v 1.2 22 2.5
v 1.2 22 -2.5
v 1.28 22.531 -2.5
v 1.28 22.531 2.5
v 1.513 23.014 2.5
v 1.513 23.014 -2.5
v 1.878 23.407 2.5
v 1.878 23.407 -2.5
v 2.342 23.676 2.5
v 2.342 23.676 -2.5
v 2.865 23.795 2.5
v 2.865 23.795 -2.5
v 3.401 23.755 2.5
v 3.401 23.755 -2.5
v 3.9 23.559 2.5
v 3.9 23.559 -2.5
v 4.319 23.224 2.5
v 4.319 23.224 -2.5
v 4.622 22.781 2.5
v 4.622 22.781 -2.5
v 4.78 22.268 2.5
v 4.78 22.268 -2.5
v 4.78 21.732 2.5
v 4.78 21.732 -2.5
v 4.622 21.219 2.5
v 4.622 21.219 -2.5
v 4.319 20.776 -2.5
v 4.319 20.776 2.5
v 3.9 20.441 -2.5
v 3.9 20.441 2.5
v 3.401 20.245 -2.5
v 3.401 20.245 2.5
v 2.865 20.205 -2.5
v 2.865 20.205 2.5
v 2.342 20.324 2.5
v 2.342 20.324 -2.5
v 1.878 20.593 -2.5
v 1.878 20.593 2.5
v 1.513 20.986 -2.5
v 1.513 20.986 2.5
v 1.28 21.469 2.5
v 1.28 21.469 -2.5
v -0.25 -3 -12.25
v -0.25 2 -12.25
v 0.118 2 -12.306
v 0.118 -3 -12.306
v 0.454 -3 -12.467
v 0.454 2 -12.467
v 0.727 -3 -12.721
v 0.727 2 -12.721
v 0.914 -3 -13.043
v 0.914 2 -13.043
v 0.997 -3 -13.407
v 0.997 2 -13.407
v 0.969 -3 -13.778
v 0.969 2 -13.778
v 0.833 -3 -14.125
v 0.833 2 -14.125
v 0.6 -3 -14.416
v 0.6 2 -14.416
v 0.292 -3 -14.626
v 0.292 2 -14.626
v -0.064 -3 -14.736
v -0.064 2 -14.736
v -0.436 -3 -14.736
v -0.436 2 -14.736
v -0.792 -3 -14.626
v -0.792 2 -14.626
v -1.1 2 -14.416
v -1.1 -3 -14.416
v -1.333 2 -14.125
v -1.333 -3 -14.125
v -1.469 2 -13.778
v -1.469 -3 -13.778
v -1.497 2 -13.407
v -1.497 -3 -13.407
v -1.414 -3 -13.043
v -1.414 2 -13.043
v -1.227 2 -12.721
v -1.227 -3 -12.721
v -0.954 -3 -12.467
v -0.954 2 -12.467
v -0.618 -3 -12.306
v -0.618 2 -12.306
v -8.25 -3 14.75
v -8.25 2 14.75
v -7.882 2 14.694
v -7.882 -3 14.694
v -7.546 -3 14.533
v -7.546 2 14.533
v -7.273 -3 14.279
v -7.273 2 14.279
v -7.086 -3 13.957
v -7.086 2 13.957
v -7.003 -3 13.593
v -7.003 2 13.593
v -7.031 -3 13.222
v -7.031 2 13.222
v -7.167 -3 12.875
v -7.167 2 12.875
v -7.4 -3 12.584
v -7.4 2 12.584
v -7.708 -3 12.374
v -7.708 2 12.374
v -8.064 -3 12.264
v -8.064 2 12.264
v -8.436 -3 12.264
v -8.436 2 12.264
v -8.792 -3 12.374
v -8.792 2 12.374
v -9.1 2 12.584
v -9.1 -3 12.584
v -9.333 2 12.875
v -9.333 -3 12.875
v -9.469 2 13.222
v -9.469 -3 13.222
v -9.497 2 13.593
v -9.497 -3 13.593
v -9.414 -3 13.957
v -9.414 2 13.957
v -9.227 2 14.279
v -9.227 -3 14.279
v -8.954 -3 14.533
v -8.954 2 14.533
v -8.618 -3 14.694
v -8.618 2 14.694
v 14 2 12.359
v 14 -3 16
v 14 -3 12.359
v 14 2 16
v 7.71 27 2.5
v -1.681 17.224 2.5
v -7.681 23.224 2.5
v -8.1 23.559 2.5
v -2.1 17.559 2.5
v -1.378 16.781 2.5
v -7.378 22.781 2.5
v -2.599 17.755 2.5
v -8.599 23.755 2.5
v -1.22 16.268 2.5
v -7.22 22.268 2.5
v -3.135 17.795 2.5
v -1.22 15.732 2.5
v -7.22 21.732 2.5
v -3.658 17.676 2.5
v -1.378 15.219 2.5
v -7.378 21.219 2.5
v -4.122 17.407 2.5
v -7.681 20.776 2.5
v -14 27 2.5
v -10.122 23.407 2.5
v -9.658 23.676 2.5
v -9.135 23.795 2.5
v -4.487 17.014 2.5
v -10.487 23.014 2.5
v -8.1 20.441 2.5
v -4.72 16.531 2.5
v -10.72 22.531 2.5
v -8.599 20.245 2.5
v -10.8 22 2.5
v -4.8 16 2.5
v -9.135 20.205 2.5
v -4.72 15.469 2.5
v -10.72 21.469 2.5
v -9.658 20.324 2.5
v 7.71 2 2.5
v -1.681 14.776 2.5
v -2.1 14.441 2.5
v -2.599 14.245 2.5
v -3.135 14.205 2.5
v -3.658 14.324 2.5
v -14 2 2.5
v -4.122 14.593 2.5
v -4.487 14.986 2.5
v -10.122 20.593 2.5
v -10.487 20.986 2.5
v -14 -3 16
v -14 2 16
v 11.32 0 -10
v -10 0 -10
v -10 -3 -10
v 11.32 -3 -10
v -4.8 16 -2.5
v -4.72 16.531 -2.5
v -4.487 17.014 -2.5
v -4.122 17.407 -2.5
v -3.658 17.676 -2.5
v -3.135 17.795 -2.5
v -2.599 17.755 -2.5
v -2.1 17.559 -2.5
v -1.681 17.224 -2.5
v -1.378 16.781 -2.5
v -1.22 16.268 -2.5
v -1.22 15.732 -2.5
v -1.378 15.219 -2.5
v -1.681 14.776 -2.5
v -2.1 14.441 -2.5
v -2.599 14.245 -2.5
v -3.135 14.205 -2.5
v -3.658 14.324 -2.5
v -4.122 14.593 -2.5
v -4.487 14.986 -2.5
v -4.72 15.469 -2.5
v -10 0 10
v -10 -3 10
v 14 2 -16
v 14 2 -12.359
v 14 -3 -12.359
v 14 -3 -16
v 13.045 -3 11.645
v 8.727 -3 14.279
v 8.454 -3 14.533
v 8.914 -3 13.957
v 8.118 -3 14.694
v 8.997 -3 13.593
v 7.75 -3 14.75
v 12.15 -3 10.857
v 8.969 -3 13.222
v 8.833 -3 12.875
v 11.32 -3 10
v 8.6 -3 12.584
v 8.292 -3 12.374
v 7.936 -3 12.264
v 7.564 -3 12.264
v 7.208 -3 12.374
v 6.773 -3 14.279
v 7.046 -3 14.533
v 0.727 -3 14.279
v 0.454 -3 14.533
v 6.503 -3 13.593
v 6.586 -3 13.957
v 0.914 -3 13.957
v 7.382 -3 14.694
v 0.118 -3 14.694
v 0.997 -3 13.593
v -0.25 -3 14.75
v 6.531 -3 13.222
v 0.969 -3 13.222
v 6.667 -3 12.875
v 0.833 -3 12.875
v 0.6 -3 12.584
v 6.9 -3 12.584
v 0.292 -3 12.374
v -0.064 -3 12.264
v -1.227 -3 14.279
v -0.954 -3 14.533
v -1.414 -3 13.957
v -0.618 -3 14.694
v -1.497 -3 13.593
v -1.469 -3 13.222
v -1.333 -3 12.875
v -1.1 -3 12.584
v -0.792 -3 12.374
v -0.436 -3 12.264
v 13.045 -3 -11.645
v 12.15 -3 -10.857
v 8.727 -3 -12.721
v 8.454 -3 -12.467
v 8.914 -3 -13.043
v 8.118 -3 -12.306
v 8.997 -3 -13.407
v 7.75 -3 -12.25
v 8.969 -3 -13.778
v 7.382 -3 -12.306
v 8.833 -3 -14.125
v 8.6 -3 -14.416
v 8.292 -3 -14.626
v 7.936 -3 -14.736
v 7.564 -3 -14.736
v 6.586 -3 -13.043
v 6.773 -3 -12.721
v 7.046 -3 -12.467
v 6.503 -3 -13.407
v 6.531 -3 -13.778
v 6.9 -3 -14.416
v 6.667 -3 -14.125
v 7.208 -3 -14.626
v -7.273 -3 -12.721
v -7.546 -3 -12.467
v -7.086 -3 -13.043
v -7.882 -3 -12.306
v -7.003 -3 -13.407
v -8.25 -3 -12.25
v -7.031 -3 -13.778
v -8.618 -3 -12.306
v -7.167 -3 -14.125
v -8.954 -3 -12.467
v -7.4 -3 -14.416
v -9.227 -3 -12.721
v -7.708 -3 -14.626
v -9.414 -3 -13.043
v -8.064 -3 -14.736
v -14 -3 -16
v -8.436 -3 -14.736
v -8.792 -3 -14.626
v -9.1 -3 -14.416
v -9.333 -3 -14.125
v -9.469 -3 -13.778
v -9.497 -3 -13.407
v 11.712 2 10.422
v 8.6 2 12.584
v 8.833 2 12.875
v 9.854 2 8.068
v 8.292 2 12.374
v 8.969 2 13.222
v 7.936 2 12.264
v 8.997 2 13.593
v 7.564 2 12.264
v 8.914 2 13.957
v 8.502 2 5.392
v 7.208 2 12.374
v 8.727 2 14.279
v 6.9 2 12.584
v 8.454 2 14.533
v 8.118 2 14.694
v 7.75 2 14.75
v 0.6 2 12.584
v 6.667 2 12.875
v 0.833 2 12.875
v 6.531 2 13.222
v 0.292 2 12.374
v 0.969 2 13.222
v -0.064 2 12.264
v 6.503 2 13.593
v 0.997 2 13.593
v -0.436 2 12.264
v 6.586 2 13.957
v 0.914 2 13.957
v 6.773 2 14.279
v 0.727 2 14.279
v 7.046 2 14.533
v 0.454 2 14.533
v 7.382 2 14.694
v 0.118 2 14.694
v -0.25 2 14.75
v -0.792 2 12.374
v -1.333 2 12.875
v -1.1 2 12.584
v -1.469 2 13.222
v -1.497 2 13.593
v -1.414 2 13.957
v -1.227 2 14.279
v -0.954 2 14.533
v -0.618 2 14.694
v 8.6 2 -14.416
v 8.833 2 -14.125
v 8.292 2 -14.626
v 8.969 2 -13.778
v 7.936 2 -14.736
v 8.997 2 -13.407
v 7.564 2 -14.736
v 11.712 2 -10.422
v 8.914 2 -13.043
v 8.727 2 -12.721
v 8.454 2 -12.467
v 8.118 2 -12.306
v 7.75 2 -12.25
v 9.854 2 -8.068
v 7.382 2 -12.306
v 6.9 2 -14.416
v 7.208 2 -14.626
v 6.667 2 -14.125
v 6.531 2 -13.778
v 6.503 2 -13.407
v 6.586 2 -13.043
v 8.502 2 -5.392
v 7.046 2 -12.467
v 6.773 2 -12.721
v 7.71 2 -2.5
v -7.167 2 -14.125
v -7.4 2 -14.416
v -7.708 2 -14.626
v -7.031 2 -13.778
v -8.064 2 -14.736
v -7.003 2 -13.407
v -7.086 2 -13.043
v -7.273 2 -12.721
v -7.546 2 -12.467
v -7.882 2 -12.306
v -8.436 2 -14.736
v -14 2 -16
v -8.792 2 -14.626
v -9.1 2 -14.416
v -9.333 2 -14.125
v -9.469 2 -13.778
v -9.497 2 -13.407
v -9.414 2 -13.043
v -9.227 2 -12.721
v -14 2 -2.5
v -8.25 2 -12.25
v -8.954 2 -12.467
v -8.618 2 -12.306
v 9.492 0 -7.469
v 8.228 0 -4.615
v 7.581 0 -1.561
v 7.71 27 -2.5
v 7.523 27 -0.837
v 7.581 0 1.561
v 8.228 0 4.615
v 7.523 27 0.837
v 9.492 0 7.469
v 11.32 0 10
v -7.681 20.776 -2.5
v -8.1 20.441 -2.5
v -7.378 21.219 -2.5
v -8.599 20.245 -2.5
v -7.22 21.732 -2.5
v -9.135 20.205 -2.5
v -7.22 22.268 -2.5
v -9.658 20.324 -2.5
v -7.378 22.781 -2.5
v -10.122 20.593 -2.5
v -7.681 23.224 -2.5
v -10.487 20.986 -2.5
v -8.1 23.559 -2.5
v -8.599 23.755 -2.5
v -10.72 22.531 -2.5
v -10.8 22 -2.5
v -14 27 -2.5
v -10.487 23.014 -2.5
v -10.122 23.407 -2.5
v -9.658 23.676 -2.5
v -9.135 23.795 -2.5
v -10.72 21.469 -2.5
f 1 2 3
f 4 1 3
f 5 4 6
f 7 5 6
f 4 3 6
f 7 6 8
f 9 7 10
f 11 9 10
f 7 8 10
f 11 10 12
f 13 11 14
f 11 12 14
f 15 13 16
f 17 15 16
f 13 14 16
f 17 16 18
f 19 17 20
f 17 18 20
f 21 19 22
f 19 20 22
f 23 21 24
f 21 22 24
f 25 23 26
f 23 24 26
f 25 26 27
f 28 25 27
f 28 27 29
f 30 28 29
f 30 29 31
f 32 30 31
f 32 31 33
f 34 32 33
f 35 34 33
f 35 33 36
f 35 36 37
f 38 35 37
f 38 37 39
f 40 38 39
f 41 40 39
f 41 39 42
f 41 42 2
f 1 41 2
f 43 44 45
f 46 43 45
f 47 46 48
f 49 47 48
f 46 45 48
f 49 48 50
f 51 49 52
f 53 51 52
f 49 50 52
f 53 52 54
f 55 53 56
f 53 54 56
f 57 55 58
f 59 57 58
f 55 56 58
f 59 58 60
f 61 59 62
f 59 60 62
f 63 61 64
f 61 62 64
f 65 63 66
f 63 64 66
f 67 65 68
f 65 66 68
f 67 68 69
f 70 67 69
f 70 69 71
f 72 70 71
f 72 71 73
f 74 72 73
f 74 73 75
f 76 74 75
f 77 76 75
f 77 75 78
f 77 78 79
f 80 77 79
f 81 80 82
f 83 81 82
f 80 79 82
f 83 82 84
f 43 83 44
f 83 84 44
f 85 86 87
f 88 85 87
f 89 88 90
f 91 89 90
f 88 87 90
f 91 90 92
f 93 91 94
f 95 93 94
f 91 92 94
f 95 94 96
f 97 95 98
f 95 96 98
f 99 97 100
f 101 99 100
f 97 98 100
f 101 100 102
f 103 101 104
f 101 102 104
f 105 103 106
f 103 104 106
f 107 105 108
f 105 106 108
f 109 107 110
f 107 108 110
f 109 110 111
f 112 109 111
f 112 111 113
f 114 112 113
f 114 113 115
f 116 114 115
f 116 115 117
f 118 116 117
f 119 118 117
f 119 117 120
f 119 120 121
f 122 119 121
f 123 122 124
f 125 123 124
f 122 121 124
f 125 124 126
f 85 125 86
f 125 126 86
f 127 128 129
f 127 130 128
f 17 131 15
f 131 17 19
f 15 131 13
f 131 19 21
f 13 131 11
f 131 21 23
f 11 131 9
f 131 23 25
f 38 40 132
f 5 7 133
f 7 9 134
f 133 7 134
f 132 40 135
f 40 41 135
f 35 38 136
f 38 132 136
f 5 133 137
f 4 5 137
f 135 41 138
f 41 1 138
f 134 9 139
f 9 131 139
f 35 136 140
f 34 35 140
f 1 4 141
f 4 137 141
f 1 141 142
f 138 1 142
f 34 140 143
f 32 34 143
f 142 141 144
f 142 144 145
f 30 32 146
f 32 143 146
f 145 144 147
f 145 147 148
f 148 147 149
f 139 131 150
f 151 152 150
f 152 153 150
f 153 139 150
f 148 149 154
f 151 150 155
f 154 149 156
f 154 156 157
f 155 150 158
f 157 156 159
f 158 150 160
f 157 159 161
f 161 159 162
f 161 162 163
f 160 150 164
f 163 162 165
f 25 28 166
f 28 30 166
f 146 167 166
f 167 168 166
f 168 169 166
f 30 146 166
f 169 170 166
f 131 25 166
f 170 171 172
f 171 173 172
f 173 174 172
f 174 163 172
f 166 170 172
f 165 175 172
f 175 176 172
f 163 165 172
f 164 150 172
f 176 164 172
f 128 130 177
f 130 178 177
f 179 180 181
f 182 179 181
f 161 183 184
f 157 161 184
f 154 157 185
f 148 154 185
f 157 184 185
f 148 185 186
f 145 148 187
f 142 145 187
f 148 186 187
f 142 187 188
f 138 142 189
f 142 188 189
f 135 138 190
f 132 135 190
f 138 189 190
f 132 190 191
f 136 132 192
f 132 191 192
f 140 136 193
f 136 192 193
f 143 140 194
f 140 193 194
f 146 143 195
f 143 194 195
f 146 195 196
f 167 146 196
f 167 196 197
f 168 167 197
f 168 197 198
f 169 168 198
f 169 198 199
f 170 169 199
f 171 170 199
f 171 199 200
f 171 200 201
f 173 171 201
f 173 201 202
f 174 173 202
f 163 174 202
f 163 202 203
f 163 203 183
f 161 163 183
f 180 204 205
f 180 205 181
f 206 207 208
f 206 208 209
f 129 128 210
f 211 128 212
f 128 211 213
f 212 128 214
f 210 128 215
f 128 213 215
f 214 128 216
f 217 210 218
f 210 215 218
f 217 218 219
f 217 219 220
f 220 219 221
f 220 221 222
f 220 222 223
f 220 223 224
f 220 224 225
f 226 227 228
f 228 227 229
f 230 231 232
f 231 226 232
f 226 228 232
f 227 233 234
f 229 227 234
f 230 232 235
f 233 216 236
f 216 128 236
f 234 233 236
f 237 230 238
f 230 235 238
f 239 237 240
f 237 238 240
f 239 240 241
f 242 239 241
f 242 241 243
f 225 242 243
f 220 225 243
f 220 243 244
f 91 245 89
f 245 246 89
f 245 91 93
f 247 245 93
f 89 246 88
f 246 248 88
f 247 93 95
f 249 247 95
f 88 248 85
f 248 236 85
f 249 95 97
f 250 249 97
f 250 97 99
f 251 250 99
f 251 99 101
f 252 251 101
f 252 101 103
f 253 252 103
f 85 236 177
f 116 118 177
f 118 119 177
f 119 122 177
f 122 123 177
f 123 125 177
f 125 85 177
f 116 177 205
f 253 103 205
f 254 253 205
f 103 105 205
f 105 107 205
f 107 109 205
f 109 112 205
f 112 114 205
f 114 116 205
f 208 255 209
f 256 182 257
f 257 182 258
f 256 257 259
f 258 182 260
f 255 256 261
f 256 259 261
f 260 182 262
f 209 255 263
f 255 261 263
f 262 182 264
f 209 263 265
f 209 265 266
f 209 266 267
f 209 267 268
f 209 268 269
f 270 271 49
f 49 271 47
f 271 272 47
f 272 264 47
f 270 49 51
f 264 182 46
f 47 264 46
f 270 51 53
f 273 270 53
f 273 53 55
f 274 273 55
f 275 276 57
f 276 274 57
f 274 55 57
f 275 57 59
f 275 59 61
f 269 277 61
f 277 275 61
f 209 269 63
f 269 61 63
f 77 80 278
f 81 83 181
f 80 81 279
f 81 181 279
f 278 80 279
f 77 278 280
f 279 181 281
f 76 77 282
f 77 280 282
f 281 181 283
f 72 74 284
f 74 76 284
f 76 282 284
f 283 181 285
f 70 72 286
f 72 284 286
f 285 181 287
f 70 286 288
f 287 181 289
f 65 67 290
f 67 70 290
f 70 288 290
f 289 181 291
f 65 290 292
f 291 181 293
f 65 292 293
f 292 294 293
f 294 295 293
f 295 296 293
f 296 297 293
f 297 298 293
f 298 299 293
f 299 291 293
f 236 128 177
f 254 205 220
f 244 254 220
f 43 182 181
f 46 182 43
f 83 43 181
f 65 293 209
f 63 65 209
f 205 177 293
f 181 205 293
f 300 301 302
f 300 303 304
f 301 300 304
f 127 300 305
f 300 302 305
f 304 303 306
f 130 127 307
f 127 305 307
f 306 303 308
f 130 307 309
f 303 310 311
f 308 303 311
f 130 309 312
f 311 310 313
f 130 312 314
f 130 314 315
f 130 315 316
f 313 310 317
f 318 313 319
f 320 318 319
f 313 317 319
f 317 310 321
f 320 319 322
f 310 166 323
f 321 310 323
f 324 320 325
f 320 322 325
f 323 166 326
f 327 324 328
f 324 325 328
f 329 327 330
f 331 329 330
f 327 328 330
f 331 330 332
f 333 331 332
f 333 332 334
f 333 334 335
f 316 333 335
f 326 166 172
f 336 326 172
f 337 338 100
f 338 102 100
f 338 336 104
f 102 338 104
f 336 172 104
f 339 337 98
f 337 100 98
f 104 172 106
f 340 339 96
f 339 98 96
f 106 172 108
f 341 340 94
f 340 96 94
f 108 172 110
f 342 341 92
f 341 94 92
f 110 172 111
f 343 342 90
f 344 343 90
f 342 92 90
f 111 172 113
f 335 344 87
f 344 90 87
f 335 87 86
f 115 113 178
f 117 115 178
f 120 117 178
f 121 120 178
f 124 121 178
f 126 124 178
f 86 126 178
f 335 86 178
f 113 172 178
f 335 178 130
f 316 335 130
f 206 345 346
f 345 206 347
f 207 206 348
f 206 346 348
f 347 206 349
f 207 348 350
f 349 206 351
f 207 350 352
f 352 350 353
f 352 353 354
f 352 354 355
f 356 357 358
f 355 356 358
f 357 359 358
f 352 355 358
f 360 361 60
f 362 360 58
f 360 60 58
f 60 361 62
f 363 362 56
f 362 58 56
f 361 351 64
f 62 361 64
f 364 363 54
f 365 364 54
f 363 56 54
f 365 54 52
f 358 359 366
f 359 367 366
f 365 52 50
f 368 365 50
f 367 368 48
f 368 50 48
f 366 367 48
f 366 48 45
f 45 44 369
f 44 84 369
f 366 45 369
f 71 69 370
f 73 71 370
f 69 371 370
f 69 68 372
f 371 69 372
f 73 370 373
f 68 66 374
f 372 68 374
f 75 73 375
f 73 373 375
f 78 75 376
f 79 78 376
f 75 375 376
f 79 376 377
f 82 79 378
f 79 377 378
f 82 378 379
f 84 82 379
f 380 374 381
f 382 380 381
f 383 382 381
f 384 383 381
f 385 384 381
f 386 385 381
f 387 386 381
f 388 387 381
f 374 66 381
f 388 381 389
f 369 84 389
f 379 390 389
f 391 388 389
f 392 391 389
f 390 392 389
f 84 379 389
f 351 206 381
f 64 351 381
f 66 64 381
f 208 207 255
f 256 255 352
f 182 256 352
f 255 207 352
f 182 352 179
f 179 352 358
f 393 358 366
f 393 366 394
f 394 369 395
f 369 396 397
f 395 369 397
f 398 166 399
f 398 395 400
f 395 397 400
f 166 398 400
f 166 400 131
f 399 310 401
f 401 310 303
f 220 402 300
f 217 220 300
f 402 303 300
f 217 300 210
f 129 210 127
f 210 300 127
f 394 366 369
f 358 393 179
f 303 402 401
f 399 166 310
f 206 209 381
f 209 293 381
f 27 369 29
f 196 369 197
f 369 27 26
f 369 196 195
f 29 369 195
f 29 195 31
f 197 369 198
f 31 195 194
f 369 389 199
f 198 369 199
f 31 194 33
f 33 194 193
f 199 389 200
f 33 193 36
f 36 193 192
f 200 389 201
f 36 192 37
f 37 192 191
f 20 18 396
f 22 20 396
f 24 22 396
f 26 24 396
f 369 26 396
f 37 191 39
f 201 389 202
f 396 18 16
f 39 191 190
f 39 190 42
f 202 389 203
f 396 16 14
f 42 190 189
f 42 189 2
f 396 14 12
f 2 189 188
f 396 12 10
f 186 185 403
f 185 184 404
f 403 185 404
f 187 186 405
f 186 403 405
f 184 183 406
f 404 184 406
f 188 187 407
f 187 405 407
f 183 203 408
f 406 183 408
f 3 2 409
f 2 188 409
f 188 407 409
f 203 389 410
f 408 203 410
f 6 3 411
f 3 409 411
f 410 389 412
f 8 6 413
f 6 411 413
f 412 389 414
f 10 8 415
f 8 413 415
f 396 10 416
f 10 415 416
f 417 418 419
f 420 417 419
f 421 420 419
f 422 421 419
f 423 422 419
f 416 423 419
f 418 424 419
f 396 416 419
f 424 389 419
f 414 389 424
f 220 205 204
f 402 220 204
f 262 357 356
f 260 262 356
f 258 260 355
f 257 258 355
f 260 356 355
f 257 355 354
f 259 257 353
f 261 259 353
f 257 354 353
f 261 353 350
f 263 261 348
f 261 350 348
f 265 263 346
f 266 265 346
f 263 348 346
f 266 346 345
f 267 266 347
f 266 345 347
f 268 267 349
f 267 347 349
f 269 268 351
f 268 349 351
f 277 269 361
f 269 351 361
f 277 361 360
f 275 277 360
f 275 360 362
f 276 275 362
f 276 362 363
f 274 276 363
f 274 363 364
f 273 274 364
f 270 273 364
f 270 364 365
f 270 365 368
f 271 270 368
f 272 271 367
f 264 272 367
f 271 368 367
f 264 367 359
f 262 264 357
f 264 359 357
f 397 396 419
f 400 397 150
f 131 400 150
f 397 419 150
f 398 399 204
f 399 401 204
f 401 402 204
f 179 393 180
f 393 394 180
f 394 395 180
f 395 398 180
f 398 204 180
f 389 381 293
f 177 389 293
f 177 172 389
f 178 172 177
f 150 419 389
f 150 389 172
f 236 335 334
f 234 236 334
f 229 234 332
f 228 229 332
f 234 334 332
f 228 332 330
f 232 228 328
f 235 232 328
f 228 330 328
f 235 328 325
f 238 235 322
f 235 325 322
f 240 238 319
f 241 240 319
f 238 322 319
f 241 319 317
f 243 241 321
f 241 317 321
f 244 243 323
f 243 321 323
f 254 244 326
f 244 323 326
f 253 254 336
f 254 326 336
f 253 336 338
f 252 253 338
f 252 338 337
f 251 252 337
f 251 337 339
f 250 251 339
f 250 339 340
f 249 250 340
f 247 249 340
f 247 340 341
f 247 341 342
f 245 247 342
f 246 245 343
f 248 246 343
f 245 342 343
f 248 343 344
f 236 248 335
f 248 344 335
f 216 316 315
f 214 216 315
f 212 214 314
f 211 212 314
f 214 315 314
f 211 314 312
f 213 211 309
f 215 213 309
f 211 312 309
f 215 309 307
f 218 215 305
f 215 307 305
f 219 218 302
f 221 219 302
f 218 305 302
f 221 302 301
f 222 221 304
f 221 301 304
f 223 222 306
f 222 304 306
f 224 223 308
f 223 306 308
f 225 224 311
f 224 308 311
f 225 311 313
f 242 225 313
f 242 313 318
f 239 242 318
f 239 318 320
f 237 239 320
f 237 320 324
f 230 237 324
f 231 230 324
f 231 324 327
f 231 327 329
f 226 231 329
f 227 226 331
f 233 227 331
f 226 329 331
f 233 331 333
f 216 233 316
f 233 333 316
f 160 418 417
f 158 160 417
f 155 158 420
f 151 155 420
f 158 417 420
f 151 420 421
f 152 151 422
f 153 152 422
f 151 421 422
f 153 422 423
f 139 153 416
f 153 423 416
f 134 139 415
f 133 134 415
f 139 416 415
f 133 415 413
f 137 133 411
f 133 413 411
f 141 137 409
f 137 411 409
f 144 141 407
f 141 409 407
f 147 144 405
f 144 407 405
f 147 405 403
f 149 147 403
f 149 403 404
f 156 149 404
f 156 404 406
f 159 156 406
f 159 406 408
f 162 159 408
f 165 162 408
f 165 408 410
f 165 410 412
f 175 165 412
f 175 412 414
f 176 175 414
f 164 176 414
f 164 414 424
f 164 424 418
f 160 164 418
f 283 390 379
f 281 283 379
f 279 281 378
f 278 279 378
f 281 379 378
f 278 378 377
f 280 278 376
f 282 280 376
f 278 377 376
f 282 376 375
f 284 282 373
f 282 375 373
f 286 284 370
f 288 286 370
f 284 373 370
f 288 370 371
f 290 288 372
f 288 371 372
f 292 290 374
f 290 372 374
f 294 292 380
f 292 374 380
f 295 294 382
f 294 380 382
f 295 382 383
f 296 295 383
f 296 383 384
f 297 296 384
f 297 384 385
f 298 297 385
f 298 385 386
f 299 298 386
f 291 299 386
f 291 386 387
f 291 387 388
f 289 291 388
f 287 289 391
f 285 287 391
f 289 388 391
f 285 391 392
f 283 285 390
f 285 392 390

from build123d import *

# Parameters (mm, degrees)
SZKIC1_W                    = 20
SZKIC1_H                    = 20
DODANIE_WYCI_GNI_CIE1_DEPTH = 2
SZKIC3_R                    = 1.25
DODANIE_WYCI_GNI_CIE2_DEPTH = 5
SZKIC4_W                    = 24
SZKIC4_H                    = 5
DODANIE_WYCI_GNI_CIE3_DEPTH = 25
DODANIE_WYCI_GNI_CIE4_DEPTH = 4
SZKIC6_R                    = 15
WYTNIJ_WYCI_GNI_CIE1_DEPTH  = 34
OTW_R_POD_RUB_M31_D         = 3.6
OTW_R_POD_RUB_M31_DEPTH     = 24


with BuildPart() as part:
    # Szkic1 → Dodanie-wyciągnięcie1 (new body)
    with BuildSketch(Plane(origin=(0, 0, 0), x_dir=(1, 0, 0), z_dir=(0, 1, 0))):
        Rectangle(SZKIC1_W, SZKIC1_H)
    extrude(amount=DODANIE_WYCI_GNI_CIE1_DEPTH)

    # Szkic3 → Dodanie-wyciągnięcie2 (add)
    with BuildSketch(Plane(origin=(0, 2, 0), x_dir=(1, 0, 0), z_dir=(0, 1, 0))):
        Polygon((-14, 16), (-14, -16), (10, -16), (10, -10), (-10, -10), (-10, 10), (10, 10), (10, 16), align=None)
        with Locations(Location((-8.25, -13.5, 0), (0, 0, 270))):
            Circle(SZKIC3_R, mode=Mode.SUBTRACT)
        with Locations(Location((-0.25, -13.5, 0), (0, 0, 270))):
            Circle(SZKIC3_R, mode=Mode.SUBTRACT)
        with Locations(Location((7.75, -13.5, 0), (0, 0, 270))):
            Circle(SZKIC3_R, mode=Mode.SUBTRACT)
        with Locations(Location((-8.25, 13.5, 0), (0, 0, 270))):
            Circle(SZKIC3_R, mode=Mode.SUBTRACT)
        with Locations(Location((-0.25, 13.5, 0), (0, 0, 270))):
            Circle(SZKIC3_R, mode=Mode.SUBTRACT)
        with Locations(Location((7.75, 13.5, 0), (0, 0, 270))):
            Circle(SZKIC3_R, mode=Mode.SUBTRACT)
    extrude(amount=-DODANIE_WYCI_GNI_CIE2_DEPTH)

    # Szkic4 → Dodanie-wyciągnięcie3 (add)
    with BuildSketch(Plane(origin=(0, 2, 0), x_dir=(1, 0, 0), z_dir=(0, 1, 0))):
        with Locations((-2, 0)):
            Rectangle(SZKIC4_W, SZKIC4_H)
    extrude(amount=DODANIE_WYCI_GNI_CIE3_DEPTH)

    # Szkic5 → Dodanie-wyciągnięcie4 (add)
    with BuildSketch(Plane(origin=(10, 0, 0), x_dir=(0, 0, -1), z_dir=(1, 0, 0))):
        Polygon((-10, 0), (10, 0), (10, -3), (16, -3), (16, 2), (2.5, 2), (2.5, 27), (-2.5, 27), (-2.5, 2), (-16, 2), (-16, -3), (-10, -3), align=None)
    extrude(amount=DODANIE_WYCI_GNI_CIE4_DEPTH)

    # Szkic6 → Wytnij-wyciągnięcie1 (cut)
    with BuildSketch(Plane(origin=(0, 27, 0), x_dir=(1, 0, 0), z_dir=(0, 1, 0))):
        with Locations((22.5, 0)):
            Circle(SZKIC6_R)
    extrude(amount=-WYTNIJ_WYCI_GNI_CIE1_DEPTH, mode=Mode.SUBTRACT)

    # Otwór pod śrubę M31
    with Locations(Plane.XY.offset(2.5)):
        with Locations((3, 22), (-9, 22), (-3, 16)):
            Hole(OTW_R_POD_RUB_M31_D / 2, depth=OTW_R_POD_RUB_M31_DEPTH)


solid = part.part
